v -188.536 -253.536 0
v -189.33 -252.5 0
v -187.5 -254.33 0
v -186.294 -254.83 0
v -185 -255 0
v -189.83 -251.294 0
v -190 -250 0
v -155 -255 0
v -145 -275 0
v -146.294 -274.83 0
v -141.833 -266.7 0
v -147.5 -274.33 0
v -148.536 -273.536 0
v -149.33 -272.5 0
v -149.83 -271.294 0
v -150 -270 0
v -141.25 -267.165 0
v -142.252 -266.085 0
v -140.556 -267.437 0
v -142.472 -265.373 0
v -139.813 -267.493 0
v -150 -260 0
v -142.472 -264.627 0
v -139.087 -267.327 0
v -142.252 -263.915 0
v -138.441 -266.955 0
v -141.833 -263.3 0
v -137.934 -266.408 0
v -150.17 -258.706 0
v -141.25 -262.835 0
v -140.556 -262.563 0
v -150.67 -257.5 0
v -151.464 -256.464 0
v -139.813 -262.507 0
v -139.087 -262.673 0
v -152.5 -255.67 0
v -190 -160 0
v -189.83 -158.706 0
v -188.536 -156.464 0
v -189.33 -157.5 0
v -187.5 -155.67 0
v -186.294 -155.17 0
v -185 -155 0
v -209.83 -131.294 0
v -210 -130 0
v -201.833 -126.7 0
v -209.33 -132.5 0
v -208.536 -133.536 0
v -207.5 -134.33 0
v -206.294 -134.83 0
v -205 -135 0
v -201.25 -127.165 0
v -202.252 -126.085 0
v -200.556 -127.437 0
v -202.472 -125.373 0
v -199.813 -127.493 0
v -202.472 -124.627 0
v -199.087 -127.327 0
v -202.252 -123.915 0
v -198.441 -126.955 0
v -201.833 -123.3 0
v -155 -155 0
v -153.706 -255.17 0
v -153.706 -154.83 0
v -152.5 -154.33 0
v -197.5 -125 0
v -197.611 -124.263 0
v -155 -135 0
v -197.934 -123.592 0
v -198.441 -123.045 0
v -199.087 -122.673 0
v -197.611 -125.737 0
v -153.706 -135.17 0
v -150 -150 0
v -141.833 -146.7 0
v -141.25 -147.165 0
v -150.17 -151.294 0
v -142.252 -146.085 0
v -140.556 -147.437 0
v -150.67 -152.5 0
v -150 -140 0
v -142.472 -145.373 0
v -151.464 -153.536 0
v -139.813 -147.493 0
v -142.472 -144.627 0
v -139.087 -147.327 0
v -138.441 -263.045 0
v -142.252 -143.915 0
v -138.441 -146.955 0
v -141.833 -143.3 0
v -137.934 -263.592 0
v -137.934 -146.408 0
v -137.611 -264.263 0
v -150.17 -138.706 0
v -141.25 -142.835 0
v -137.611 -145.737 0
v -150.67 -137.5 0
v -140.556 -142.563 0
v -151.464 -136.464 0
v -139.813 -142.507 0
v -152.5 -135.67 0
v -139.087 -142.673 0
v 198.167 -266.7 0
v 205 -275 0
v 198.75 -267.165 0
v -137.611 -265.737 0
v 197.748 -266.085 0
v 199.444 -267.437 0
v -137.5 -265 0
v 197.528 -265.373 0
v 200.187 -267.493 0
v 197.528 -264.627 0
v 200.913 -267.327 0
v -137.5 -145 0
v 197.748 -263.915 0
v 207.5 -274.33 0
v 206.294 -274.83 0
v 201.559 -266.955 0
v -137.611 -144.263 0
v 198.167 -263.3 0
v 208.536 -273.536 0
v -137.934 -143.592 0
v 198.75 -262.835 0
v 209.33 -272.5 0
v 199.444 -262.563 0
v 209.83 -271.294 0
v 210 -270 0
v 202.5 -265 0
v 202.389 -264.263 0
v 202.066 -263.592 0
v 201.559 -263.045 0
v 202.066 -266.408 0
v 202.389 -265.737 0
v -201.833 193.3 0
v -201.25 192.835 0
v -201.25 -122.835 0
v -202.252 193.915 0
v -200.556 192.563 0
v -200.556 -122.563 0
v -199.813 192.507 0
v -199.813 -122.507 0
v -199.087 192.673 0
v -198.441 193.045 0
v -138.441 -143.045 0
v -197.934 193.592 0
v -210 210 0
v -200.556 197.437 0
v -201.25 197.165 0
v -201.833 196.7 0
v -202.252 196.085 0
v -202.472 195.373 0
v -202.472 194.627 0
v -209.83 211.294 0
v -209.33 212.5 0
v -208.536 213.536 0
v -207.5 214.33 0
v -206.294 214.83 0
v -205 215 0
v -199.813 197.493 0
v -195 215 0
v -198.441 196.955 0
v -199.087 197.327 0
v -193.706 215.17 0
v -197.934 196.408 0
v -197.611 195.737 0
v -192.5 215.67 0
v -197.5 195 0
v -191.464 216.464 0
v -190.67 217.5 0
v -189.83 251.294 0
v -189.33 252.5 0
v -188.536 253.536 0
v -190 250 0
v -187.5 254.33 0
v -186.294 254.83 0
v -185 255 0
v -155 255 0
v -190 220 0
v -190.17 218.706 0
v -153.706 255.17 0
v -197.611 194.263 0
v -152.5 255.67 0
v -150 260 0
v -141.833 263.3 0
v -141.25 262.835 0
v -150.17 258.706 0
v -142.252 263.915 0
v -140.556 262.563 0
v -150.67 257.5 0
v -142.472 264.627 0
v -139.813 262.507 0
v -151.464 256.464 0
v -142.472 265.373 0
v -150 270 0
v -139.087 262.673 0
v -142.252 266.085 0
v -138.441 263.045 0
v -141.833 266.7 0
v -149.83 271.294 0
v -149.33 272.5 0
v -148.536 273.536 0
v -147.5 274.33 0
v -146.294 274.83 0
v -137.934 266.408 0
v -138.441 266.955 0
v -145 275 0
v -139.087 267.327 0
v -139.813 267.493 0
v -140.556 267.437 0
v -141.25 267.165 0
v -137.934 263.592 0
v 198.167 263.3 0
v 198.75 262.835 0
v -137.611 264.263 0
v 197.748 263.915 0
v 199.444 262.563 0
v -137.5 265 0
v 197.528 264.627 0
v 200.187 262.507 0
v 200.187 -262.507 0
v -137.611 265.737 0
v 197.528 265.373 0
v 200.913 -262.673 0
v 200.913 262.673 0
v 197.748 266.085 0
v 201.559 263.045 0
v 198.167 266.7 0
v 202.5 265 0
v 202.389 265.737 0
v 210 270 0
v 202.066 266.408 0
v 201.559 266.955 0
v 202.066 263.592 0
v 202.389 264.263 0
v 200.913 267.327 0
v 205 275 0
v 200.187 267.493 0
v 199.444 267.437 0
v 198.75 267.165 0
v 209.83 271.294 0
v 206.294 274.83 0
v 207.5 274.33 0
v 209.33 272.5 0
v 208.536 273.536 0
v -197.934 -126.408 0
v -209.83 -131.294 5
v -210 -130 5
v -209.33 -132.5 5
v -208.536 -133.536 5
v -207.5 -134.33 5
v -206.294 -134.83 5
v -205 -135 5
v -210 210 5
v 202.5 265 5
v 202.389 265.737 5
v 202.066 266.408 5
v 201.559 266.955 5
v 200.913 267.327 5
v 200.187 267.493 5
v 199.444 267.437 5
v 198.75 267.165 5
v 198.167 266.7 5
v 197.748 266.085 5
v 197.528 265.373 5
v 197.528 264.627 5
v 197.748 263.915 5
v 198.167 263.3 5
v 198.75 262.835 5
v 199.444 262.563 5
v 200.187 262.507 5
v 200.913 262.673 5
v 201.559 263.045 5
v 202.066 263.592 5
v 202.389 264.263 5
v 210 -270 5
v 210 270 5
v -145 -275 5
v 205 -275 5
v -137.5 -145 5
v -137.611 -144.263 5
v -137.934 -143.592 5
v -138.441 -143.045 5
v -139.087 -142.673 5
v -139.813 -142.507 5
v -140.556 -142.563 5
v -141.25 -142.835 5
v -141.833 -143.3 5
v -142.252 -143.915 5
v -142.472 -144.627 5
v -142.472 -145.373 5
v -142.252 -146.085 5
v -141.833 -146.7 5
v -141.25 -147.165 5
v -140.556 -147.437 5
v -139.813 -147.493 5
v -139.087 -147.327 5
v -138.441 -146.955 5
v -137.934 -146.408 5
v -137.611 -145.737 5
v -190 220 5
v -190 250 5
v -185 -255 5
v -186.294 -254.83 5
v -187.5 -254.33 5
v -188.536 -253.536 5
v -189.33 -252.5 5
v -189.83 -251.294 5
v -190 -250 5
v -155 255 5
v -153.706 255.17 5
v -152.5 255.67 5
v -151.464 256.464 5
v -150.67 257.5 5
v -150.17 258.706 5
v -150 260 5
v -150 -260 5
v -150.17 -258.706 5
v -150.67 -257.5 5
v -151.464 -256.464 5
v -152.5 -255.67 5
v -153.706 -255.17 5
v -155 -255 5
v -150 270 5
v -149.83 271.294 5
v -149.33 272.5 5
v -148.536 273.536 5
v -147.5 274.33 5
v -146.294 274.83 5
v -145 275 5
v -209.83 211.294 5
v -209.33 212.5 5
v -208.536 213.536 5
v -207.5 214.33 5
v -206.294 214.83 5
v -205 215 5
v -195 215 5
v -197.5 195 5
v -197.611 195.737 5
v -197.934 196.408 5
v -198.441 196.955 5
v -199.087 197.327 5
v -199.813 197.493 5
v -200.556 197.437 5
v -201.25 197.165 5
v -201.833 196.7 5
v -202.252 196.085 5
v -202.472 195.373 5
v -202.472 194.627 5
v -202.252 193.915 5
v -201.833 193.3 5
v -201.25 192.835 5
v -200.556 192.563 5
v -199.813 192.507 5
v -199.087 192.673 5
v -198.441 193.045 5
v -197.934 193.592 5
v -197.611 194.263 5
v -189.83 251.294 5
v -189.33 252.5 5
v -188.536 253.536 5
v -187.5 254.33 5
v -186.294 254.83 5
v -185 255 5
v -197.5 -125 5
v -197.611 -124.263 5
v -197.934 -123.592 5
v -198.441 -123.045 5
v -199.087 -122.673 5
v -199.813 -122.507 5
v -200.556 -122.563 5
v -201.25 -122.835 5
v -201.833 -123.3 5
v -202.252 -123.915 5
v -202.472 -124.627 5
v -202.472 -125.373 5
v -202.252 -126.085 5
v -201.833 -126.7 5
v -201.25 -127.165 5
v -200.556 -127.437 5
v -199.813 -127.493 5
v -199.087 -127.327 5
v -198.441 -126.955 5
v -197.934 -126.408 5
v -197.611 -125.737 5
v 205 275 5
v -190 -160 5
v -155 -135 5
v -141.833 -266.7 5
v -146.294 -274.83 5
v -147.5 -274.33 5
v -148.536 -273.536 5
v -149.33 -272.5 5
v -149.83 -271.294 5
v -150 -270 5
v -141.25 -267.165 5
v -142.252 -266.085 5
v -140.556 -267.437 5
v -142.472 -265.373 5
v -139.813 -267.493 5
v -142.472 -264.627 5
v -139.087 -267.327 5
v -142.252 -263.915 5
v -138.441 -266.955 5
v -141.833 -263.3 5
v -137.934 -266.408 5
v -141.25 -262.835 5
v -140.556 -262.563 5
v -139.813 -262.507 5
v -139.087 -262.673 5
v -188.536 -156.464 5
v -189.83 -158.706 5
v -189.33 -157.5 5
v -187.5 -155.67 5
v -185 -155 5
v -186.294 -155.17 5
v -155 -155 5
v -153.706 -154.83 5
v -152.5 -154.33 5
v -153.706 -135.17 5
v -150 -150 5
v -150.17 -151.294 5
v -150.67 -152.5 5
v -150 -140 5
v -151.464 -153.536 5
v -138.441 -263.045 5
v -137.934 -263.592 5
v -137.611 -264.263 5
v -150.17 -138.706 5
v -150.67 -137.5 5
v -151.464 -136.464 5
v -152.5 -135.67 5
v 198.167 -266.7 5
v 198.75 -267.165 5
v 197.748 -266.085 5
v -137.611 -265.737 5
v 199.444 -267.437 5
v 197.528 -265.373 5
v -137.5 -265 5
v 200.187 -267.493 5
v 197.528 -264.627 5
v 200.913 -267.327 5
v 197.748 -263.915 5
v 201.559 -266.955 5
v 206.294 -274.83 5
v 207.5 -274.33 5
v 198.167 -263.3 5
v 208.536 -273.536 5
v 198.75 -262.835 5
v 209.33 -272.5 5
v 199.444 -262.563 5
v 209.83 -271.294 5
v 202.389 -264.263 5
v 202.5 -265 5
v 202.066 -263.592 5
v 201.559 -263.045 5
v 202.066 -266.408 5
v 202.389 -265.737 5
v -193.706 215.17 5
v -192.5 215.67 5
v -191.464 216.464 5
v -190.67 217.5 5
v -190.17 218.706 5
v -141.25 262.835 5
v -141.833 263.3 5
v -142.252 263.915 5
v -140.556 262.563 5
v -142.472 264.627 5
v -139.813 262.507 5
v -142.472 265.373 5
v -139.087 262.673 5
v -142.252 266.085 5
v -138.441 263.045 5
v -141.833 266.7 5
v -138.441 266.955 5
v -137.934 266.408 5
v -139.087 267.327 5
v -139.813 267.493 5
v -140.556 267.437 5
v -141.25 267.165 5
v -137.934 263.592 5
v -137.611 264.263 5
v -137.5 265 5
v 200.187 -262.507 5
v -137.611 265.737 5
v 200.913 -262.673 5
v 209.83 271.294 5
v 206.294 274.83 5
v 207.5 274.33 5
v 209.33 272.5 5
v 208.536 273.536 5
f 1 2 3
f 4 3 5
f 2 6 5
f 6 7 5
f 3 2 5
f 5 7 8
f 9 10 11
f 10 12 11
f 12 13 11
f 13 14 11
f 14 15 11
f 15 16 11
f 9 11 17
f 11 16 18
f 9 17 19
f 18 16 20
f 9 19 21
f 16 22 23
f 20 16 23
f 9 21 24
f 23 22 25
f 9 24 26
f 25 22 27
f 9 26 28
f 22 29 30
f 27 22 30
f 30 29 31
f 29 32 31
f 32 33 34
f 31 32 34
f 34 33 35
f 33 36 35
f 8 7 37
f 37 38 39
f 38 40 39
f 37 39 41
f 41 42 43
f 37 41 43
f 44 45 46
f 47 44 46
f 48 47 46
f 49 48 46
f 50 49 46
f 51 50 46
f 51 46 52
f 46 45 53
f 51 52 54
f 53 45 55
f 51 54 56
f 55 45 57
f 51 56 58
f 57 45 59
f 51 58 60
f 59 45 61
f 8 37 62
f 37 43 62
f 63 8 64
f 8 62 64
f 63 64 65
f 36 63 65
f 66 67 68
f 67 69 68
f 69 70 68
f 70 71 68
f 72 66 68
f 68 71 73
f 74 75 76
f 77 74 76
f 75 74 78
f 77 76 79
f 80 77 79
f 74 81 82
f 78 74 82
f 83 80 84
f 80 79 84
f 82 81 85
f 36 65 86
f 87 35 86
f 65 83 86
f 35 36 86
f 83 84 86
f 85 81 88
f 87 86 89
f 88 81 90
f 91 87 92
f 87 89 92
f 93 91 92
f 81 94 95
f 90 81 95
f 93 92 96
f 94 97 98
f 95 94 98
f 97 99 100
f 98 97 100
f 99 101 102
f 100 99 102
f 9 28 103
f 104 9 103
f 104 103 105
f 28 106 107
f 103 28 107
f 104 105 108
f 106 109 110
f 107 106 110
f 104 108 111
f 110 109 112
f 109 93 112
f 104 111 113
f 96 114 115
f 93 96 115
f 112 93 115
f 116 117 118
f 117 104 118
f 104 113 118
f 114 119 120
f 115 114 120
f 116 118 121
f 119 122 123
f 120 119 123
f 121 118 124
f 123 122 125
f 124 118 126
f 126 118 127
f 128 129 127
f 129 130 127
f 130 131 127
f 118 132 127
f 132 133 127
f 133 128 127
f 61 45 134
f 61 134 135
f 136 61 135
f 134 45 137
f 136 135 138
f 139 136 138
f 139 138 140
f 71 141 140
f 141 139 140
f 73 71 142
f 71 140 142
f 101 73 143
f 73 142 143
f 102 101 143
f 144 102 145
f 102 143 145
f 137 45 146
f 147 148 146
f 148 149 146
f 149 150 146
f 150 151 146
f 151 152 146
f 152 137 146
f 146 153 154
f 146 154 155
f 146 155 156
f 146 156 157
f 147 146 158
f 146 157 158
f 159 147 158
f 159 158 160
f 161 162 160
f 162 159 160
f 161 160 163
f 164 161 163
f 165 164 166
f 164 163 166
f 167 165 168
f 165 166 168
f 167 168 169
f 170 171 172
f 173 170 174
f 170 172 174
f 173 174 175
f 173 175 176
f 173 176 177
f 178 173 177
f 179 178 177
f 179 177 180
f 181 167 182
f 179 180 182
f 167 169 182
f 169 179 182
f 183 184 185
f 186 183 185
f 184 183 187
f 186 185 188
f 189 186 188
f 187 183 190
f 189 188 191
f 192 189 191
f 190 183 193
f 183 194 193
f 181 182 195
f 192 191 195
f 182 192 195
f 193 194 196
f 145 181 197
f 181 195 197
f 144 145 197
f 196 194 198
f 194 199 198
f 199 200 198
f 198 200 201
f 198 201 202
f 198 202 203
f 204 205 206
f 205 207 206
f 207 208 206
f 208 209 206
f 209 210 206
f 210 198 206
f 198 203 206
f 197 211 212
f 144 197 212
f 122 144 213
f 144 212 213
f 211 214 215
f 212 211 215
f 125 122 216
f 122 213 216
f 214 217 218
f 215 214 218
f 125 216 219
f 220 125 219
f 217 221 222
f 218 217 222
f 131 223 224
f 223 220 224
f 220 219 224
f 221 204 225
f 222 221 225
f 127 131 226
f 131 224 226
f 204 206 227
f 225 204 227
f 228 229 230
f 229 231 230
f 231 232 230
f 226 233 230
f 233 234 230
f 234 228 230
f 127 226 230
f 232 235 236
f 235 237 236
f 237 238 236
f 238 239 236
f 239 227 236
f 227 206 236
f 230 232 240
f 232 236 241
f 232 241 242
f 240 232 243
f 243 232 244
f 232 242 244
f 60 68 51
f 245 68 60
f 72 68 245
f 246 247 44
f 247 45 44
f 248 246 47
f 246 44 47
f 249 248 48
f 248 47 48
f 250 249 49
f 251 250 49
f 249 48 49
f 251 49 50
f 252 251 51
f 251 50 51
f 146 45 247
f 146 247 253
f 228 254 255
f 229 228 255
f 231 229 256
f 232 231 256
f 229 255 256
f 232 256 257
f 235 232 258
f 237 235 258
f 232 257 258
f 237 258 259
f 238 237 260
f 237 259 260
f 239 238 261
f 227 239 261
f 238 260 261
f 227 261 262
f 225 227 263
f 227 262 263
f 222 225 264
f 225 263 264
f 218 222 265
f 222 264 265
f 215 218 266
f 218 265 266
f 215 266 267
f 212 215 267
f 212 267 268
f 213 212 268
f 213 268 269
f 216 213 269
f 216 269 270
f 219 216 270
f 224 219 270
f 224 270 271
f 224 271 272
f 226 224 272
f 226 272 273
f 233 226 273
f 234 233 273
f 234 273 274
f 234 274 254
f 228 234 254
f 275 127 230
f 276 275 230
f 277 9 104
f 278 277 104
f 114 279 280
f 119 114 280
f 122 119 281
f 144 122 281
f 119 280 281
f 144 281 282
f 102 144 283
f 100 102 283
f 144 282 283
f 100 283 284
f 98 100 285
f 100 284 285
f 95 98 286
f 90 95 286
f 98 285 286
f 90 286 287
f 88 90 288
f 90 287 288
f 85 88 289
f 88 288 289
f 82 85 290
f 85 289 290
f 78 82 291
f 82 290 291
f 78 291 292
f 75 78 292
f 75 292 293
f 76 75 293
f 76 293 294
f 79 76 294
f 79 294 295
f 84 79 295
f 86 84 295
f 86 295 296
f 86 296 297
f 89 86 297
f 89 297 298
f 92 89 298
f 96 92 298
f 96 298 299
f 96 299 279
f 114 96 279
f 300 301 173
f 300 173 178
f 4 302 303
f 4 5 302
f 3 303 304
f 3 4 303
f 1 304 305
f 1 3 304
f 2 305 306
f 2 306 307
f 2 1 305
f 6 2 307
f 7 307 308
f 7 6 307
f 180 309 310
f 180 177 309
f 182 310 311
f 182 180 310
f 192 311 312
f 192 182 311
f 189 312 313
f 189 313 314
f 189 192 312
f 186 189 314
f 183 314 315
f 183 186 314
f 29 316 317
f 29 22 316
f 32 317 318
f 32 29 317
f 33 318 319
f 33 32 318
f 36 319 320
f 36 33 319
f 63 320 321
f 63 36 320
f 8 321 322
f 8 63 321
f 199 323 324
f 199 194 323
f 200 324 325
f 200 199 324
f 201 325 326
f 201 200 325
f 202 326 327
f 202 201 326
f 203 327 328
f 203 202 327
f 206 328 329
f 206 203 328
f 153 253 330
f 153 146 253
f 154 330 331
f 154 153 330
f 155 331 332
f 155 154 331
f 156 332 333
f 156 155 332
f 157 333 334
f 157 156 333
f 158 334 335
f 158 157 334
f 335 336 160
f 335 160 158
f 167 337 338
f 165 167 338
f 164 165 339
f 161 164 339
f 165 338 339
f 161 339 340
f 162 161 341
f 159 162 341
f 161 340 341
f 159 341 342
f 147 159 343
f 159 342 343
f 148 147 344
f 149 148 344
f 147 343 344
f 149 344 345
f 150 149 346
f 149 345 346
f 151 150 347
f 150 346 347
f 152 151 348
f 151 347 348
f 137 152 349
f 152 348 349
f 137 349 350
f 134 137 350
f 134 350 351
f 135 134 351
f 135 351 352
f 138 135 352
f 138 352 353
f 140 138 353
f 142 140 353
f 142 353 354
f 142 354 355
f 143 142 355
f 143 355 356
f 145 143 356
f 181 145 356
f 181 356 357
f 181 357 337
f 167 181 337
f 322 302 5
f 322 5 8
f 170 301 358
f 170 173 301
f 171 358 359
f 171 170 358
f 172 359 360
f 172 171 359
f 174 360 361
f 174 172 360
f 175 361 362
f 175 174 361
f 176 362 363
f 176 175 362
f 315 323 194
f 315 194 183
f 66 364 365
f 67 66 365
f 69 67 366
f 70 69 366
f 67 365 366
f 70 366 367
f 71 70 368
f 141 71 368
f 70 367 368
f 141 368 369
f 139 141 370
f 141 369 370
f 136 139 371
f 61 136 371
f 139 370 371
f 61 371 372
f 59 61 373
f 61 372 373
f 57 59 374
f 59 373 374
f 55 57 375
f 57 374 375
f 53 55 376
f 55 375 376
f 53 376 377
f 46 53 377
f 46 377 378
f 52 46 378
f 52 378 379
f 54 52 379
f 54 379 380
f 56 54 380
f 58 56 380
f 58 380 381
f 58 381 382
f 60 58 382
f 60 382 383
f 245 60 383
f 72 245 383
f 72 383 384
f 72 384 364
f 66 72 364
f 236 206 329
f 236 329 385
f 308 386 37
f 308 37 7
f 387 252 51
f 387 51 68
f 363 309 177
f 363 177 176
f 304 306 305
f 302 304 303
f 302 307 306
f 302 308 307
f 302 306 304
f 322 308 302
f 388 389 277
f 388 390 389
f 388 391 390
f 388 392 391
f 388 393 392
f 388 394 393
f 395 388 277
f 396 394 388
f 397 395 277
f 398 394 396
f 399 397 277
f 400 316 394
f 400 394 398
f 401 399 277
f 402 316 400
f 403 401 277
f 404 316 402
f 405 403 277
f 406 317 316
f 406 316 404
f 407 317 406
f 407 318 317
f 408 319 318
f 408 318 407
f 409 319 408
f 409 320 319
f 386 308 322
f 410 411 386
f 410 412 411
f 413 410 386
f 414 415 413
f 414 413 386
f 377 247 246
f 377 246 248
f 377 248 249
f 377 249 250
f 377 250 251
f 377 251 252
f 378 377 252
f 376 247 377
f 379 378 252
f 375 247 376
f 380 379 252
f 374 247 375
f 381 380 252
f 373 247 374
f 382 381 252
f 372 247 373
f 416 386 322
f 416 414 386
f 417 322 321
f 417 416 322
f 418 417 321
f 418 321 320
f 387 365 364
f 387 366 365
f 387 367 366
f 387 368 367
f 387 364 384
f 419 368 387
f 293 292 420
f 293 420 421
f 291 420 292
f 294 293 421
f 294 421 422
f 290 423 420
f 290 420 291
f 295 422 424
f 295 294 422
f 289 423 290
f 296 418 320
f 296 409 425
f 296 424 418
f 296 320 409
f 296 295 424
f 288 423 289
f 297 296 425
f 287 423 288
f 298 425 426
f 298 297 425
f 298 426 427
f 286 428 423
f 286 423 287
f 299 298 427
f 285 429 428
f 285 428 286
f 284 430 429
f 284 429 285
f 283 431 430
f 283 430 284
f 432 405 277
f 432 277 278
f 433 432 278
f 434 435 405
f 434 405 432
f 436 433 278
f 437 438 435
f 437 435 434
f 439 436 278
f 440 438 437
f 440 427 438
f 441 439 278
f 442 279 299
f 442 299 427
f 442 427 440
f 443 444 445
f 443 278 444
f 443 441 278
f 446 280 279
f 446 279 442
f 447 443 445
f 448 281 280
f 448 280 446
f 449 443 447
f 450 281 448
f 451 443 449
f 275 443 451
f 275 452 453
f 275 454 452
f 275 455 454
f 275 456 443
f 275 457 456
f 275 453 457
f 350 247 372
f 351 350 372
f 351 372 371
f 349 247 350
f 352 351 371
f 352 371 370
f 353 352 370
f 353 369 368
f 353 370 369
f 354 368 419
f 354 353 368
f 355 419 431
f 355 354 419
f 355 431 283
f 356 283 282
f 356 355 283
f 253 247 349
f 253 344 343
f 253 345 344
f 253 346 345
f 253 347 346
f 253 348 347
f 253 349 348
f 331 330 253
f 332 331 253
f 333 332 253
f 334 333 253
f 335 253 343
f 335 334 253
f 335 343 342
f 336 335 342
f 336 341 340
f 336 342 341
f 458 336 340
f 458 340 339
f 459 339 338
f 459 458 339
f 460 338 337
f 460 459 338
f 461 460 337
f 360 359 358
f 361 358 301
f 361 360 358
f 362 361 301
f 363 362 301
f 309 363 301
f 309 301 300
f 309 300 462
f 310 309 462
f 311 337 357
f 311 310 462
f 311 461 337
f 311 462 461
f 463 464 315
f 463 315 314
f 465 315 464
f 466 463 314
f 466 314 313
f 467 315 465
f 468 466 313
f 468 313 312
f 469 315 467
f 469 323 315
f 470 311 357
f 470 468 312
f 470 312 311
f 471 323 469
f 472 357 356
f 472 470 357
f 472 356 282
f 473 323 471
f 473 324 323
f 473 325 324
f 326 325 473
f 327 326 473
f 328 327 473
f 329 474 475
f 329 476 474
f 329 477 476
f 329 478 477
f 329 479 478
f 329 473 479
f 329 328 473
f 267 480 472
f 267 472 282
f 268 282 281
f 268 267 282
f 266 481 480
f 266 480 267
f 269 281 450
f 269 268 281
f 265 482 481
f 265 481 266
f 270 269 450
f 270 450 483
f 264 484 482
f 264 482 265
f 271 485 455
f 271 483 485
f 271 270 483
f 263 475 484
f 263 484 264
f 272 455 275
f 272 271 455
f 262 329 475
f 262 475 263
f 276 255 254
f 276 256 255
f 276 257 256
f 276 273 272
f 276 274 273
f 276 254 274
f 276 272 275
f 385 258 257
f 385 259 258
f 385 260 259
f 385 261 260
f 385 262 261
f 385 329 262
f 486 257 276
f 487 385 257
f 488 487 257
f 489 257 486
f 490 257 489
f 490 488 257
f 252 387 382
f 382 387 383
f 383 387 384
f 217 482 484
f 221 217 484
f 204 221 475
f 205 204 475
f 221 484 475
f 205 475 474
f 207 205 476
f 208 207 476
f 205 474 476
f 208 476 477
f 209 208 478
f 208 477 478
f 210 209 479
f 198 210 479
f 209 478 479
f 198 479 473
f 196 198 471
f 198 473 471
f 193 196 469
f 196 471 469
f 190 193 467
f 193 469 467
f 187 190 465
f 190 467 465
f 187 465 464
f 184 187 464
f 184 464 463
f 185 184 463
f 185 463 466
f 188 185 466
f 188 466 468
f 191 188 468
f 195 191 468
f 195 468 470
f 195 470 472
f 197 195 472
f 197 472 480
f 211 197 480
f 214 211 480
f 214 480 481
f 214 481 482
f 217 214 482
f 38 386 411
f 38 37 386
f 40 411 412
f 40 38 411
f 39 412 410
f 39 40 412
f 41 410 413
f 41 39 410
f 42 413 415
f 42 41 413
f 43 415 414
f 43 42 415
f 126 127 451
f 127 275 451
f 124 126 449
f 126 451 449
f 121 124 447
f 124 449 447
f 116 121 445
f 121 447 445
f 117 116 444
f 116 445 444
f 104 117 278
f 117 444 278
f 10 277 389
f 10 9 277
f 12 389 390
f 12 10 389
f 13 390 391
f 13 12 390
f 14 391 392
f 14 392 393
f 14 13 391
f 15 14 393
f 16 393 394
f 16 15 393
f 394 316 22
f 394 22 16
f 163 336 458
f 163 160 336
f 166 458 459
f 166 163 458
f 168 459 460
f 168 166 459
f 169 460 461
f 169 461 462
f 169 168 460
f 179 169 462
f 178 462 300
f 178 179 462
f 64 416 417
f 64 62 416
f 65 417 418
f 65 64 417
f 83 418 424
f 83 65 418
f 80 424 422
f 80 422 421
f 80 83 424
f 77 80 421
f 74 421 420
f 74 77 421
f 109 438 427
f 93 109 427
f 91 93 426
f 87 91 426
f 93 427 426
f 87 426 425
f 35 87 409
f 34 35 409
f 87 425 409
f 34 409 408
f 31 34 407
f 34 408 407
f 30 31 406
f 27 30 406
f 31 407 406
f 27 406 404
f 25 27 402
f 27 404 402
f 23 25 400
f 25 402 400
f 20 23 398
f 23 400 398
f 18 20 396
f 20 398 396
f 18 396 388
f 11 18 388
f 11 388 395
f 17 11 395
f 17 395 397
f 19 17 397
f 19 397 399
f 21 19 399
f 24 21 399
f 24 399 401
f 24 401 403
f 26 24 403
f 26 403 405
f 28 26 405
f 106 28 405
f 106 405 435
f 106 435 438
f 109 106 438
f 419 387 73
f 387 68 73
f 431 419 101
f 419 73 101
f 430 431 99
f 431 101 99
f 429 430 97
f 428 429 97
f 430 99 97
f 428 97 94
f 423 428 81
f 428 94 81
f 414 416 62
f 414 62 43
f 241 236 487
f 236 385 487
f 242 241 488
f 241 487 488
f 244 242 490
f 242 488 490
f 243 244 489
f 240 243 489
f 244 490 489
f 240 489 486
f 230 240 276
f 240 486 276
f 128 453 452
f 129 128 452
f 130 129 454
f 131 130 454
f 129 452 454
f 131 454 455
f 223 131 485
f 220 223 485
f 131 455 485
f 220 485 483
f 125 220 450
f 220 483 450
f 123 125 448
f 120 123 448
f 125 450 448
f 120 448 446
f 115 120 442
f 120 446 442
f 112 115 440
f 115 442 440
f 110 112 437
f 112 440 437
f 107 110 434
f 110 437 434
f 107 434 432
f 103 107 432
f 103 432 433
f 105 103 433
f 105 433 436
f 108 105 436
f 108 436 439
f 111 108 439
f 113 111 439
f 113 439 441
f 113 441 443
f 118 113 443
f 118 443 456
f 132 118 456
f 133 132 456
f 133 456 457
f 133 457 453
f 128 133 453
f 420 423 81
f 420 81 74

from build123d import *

# Parameters (mm, degrees)
SKETCH_1_W          = 420
SKETCH_1_H          = 550
EXTRUDE_1_DEPTH     = 5
SKETCH_2_R          = 2.5
CUT_EXTRUDE_1_DEPTH = 15
FILLET_1_R          = 5


with BuildPart() as part:
    # 草图1 → 凸台-拉伸1 (new body)
    with BuildSketch(Plane.XY):
        Rectangle(SKETCH_1_W, SKETCH_1_H)
    extrude(amount=EXTRUDE_1_DEPTH)

    # 草图2 → 切除-拉伸1 (cut)
    with BuildSketch(Plane.XY.offset(5)):
        with Locations((-200, 195)):
            Circle(SKETCH_2_R)
        with Locations((-140, 265)):
            Circle(SKETCH_2_R)
        with Locations((-140, -265)):
            Circle(SKETCH_2_R)
        with Locations((-140, -145)):
            Circle(SKETCH_2_R)
        with Locations((-200, -125)):
            Circle(SKETCH_2_R)
        with Locations((200, 265)):
            Circle(SKETCH_2_R)
        with Locations((200, -265)):
            Circle(SKETCH_2_R)
        Polygon((-190, 255), (-190, 215), (-210, 215), (-210, 275), (-150, 275), (-150, 255), align=None)
        Polygon((-190, -255), (-150, -255), (-150, -275), (-210, -275), (-210, -135), (-150, -135), (-150, -155), (-190, -155), align=None)
    extrude(amount=-CUT_EXTRUDE_1_DEPTH, mode=Mode.SUBTRACT)

    # 圆角1
    fillet_1_edges = [part.edges().sort_by_distance(p)[0] for p in [
        (-210, -135, 2.5),
        (-150, -135, 2.5),
        (-150, -155, 2.5),
        (-190, -155, 2.5),
        (-190, -255, 2.5),
        (-150, -255, 2.5),
        (-150, -275, 2.5),
        (-150, 275, 2.5),
        (-150, 255, 2.5),
        (-190, 255, 2.5),
        (-190, 215, 2.5),
        (-210, 215, 2.5),
        (210, -275, 2.5),
        (210, 275, 2.5),
    ]]
    fillet(fillet_1_edges, radius=FILLET_1_R)


solid = part.part
